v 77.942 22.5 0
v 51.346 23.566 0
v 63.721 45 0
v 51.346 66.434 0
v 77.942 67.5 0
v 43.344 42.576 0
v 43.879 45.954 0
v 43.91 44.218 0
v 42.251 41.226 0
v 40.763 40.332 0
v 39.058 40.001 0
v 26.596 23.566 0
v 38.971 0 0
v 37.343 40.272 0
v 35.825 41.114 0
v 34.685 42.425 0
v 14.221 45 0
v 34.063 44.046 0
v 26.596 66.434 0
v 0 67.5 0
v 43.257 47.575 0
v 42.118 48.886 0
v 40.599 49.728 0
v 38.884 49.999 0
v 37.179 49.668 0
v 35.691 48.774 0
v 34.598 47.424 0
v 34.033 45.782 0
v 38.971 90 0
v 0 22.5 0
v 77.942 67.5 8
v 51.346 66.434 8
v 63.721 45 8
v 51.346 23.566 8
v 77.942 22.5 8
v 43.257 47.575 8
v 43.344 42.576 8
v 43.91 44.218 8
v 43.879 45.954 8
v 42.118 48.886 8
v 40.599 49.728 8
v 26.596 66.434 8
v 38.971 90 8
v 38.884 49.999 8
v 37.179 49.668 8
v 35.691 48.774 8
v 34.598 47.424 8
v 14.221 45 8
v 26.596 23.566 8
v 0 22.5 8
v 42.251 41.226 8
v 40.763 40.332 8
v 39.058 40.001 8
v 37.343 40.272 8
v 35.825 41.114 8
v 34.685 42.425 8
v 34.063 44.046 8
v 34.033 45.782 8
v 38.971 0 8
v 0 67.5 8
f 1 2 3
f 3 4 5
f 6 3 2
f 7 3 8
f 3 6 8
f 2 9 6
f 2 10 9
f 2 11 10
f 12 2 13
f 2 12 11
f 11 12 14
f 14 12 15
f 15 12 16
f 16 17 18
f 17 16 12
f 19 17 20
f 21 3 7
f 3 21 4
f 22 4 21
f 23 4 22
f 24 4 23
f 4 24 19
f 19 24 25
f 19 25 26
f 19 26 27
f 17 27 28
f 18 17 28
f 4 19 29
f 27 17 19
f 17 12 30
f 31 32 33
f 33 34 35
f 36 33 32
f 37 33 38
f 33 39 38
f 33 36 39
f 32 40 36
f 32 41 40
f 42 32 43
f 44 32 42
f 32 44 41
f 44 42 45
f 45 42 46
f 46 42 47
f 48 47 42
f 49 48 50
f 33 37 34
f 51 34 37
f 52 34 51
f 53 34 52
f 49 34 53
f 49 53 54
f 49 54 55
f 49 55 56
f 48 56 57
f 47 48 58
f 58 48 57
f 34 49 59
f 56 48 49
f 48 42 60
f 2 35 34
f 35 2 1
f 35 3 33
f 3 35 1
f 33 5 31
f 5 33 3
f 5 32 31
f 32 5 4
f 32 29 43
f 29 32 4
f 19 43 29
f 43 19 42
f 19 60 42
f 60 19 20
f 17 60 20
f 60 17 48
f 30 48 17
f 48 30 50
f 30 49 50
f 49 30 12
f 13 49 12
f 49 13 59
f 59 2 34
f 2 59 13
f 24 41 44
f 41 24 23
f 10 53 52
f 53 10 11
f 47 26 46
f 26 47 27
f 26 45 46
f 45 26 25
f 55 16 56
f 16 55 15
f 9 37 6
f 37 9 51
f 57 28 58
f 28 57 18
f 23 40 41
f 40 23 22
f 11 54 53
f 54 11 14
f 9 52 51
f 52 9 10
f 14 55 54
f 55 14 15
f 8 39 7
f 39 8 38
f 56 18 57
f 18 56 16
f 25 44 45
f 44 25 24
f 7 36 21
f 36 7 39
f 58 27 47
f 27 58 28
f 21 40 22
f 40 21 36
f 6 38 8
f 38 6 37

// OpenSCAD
$fn = 32;

// ----------------------------------------------------------------------
// Star wheel: 6-point star, R45
// ----------------------------------------------------------------------

// --- parameters (mm) ---
n_points = 6;             // number of points / teeth
r_out = 45;               // tip radius
r_in = 24.75;             // root radius
bore_r = 5;               // centre bore radius
plate_t = 8;              // plate thickness, Z (extrusion height)
bore_d = 10;              // centre bore diameter
fit_tol = 0.1;            // declared fit tolerance (prompt contract)
free_tol = 0.5;           // declared free tolerance (prompt contract)

profile = [[38.971, 90], [26.596, 66.434], [0, 67.5], [14.221, 45], [0, 22.5], [26.596, 23.566], [38.971, 0], [51.346, 23.566], [77.942, 22.5], [63.721, 45], [77.942, 67.5], [51.346, 66.434]];  // primary outline, 12 points, counter clockwise
void_1 = [[43.879, 45.954], [43.257, 47.575], [42.118, 48.886], [40.599, 49.728], [38.884, 49.999], [37.179, 49.668], [35.691, 48.774], [34.598, 47.424], [34.033, 45.782], [34.063, 44.046], [34.685, 42.425], [35.825, 41.114], [37.343, 40.272], [39.058, 40.001], [40.763, 40.332], [42.251, 41.226], [43.344, 42.576], [43.91, 44.218]];  // centre bore, 18 points

// --- the one profile operation ---
difference() {
  linear_extrude(height = plate_t) polygon(points = profile);
  translate([0, 0, -1])
    linear_extrude(height = plate_t + 2) polygon(points = void_1);
}
